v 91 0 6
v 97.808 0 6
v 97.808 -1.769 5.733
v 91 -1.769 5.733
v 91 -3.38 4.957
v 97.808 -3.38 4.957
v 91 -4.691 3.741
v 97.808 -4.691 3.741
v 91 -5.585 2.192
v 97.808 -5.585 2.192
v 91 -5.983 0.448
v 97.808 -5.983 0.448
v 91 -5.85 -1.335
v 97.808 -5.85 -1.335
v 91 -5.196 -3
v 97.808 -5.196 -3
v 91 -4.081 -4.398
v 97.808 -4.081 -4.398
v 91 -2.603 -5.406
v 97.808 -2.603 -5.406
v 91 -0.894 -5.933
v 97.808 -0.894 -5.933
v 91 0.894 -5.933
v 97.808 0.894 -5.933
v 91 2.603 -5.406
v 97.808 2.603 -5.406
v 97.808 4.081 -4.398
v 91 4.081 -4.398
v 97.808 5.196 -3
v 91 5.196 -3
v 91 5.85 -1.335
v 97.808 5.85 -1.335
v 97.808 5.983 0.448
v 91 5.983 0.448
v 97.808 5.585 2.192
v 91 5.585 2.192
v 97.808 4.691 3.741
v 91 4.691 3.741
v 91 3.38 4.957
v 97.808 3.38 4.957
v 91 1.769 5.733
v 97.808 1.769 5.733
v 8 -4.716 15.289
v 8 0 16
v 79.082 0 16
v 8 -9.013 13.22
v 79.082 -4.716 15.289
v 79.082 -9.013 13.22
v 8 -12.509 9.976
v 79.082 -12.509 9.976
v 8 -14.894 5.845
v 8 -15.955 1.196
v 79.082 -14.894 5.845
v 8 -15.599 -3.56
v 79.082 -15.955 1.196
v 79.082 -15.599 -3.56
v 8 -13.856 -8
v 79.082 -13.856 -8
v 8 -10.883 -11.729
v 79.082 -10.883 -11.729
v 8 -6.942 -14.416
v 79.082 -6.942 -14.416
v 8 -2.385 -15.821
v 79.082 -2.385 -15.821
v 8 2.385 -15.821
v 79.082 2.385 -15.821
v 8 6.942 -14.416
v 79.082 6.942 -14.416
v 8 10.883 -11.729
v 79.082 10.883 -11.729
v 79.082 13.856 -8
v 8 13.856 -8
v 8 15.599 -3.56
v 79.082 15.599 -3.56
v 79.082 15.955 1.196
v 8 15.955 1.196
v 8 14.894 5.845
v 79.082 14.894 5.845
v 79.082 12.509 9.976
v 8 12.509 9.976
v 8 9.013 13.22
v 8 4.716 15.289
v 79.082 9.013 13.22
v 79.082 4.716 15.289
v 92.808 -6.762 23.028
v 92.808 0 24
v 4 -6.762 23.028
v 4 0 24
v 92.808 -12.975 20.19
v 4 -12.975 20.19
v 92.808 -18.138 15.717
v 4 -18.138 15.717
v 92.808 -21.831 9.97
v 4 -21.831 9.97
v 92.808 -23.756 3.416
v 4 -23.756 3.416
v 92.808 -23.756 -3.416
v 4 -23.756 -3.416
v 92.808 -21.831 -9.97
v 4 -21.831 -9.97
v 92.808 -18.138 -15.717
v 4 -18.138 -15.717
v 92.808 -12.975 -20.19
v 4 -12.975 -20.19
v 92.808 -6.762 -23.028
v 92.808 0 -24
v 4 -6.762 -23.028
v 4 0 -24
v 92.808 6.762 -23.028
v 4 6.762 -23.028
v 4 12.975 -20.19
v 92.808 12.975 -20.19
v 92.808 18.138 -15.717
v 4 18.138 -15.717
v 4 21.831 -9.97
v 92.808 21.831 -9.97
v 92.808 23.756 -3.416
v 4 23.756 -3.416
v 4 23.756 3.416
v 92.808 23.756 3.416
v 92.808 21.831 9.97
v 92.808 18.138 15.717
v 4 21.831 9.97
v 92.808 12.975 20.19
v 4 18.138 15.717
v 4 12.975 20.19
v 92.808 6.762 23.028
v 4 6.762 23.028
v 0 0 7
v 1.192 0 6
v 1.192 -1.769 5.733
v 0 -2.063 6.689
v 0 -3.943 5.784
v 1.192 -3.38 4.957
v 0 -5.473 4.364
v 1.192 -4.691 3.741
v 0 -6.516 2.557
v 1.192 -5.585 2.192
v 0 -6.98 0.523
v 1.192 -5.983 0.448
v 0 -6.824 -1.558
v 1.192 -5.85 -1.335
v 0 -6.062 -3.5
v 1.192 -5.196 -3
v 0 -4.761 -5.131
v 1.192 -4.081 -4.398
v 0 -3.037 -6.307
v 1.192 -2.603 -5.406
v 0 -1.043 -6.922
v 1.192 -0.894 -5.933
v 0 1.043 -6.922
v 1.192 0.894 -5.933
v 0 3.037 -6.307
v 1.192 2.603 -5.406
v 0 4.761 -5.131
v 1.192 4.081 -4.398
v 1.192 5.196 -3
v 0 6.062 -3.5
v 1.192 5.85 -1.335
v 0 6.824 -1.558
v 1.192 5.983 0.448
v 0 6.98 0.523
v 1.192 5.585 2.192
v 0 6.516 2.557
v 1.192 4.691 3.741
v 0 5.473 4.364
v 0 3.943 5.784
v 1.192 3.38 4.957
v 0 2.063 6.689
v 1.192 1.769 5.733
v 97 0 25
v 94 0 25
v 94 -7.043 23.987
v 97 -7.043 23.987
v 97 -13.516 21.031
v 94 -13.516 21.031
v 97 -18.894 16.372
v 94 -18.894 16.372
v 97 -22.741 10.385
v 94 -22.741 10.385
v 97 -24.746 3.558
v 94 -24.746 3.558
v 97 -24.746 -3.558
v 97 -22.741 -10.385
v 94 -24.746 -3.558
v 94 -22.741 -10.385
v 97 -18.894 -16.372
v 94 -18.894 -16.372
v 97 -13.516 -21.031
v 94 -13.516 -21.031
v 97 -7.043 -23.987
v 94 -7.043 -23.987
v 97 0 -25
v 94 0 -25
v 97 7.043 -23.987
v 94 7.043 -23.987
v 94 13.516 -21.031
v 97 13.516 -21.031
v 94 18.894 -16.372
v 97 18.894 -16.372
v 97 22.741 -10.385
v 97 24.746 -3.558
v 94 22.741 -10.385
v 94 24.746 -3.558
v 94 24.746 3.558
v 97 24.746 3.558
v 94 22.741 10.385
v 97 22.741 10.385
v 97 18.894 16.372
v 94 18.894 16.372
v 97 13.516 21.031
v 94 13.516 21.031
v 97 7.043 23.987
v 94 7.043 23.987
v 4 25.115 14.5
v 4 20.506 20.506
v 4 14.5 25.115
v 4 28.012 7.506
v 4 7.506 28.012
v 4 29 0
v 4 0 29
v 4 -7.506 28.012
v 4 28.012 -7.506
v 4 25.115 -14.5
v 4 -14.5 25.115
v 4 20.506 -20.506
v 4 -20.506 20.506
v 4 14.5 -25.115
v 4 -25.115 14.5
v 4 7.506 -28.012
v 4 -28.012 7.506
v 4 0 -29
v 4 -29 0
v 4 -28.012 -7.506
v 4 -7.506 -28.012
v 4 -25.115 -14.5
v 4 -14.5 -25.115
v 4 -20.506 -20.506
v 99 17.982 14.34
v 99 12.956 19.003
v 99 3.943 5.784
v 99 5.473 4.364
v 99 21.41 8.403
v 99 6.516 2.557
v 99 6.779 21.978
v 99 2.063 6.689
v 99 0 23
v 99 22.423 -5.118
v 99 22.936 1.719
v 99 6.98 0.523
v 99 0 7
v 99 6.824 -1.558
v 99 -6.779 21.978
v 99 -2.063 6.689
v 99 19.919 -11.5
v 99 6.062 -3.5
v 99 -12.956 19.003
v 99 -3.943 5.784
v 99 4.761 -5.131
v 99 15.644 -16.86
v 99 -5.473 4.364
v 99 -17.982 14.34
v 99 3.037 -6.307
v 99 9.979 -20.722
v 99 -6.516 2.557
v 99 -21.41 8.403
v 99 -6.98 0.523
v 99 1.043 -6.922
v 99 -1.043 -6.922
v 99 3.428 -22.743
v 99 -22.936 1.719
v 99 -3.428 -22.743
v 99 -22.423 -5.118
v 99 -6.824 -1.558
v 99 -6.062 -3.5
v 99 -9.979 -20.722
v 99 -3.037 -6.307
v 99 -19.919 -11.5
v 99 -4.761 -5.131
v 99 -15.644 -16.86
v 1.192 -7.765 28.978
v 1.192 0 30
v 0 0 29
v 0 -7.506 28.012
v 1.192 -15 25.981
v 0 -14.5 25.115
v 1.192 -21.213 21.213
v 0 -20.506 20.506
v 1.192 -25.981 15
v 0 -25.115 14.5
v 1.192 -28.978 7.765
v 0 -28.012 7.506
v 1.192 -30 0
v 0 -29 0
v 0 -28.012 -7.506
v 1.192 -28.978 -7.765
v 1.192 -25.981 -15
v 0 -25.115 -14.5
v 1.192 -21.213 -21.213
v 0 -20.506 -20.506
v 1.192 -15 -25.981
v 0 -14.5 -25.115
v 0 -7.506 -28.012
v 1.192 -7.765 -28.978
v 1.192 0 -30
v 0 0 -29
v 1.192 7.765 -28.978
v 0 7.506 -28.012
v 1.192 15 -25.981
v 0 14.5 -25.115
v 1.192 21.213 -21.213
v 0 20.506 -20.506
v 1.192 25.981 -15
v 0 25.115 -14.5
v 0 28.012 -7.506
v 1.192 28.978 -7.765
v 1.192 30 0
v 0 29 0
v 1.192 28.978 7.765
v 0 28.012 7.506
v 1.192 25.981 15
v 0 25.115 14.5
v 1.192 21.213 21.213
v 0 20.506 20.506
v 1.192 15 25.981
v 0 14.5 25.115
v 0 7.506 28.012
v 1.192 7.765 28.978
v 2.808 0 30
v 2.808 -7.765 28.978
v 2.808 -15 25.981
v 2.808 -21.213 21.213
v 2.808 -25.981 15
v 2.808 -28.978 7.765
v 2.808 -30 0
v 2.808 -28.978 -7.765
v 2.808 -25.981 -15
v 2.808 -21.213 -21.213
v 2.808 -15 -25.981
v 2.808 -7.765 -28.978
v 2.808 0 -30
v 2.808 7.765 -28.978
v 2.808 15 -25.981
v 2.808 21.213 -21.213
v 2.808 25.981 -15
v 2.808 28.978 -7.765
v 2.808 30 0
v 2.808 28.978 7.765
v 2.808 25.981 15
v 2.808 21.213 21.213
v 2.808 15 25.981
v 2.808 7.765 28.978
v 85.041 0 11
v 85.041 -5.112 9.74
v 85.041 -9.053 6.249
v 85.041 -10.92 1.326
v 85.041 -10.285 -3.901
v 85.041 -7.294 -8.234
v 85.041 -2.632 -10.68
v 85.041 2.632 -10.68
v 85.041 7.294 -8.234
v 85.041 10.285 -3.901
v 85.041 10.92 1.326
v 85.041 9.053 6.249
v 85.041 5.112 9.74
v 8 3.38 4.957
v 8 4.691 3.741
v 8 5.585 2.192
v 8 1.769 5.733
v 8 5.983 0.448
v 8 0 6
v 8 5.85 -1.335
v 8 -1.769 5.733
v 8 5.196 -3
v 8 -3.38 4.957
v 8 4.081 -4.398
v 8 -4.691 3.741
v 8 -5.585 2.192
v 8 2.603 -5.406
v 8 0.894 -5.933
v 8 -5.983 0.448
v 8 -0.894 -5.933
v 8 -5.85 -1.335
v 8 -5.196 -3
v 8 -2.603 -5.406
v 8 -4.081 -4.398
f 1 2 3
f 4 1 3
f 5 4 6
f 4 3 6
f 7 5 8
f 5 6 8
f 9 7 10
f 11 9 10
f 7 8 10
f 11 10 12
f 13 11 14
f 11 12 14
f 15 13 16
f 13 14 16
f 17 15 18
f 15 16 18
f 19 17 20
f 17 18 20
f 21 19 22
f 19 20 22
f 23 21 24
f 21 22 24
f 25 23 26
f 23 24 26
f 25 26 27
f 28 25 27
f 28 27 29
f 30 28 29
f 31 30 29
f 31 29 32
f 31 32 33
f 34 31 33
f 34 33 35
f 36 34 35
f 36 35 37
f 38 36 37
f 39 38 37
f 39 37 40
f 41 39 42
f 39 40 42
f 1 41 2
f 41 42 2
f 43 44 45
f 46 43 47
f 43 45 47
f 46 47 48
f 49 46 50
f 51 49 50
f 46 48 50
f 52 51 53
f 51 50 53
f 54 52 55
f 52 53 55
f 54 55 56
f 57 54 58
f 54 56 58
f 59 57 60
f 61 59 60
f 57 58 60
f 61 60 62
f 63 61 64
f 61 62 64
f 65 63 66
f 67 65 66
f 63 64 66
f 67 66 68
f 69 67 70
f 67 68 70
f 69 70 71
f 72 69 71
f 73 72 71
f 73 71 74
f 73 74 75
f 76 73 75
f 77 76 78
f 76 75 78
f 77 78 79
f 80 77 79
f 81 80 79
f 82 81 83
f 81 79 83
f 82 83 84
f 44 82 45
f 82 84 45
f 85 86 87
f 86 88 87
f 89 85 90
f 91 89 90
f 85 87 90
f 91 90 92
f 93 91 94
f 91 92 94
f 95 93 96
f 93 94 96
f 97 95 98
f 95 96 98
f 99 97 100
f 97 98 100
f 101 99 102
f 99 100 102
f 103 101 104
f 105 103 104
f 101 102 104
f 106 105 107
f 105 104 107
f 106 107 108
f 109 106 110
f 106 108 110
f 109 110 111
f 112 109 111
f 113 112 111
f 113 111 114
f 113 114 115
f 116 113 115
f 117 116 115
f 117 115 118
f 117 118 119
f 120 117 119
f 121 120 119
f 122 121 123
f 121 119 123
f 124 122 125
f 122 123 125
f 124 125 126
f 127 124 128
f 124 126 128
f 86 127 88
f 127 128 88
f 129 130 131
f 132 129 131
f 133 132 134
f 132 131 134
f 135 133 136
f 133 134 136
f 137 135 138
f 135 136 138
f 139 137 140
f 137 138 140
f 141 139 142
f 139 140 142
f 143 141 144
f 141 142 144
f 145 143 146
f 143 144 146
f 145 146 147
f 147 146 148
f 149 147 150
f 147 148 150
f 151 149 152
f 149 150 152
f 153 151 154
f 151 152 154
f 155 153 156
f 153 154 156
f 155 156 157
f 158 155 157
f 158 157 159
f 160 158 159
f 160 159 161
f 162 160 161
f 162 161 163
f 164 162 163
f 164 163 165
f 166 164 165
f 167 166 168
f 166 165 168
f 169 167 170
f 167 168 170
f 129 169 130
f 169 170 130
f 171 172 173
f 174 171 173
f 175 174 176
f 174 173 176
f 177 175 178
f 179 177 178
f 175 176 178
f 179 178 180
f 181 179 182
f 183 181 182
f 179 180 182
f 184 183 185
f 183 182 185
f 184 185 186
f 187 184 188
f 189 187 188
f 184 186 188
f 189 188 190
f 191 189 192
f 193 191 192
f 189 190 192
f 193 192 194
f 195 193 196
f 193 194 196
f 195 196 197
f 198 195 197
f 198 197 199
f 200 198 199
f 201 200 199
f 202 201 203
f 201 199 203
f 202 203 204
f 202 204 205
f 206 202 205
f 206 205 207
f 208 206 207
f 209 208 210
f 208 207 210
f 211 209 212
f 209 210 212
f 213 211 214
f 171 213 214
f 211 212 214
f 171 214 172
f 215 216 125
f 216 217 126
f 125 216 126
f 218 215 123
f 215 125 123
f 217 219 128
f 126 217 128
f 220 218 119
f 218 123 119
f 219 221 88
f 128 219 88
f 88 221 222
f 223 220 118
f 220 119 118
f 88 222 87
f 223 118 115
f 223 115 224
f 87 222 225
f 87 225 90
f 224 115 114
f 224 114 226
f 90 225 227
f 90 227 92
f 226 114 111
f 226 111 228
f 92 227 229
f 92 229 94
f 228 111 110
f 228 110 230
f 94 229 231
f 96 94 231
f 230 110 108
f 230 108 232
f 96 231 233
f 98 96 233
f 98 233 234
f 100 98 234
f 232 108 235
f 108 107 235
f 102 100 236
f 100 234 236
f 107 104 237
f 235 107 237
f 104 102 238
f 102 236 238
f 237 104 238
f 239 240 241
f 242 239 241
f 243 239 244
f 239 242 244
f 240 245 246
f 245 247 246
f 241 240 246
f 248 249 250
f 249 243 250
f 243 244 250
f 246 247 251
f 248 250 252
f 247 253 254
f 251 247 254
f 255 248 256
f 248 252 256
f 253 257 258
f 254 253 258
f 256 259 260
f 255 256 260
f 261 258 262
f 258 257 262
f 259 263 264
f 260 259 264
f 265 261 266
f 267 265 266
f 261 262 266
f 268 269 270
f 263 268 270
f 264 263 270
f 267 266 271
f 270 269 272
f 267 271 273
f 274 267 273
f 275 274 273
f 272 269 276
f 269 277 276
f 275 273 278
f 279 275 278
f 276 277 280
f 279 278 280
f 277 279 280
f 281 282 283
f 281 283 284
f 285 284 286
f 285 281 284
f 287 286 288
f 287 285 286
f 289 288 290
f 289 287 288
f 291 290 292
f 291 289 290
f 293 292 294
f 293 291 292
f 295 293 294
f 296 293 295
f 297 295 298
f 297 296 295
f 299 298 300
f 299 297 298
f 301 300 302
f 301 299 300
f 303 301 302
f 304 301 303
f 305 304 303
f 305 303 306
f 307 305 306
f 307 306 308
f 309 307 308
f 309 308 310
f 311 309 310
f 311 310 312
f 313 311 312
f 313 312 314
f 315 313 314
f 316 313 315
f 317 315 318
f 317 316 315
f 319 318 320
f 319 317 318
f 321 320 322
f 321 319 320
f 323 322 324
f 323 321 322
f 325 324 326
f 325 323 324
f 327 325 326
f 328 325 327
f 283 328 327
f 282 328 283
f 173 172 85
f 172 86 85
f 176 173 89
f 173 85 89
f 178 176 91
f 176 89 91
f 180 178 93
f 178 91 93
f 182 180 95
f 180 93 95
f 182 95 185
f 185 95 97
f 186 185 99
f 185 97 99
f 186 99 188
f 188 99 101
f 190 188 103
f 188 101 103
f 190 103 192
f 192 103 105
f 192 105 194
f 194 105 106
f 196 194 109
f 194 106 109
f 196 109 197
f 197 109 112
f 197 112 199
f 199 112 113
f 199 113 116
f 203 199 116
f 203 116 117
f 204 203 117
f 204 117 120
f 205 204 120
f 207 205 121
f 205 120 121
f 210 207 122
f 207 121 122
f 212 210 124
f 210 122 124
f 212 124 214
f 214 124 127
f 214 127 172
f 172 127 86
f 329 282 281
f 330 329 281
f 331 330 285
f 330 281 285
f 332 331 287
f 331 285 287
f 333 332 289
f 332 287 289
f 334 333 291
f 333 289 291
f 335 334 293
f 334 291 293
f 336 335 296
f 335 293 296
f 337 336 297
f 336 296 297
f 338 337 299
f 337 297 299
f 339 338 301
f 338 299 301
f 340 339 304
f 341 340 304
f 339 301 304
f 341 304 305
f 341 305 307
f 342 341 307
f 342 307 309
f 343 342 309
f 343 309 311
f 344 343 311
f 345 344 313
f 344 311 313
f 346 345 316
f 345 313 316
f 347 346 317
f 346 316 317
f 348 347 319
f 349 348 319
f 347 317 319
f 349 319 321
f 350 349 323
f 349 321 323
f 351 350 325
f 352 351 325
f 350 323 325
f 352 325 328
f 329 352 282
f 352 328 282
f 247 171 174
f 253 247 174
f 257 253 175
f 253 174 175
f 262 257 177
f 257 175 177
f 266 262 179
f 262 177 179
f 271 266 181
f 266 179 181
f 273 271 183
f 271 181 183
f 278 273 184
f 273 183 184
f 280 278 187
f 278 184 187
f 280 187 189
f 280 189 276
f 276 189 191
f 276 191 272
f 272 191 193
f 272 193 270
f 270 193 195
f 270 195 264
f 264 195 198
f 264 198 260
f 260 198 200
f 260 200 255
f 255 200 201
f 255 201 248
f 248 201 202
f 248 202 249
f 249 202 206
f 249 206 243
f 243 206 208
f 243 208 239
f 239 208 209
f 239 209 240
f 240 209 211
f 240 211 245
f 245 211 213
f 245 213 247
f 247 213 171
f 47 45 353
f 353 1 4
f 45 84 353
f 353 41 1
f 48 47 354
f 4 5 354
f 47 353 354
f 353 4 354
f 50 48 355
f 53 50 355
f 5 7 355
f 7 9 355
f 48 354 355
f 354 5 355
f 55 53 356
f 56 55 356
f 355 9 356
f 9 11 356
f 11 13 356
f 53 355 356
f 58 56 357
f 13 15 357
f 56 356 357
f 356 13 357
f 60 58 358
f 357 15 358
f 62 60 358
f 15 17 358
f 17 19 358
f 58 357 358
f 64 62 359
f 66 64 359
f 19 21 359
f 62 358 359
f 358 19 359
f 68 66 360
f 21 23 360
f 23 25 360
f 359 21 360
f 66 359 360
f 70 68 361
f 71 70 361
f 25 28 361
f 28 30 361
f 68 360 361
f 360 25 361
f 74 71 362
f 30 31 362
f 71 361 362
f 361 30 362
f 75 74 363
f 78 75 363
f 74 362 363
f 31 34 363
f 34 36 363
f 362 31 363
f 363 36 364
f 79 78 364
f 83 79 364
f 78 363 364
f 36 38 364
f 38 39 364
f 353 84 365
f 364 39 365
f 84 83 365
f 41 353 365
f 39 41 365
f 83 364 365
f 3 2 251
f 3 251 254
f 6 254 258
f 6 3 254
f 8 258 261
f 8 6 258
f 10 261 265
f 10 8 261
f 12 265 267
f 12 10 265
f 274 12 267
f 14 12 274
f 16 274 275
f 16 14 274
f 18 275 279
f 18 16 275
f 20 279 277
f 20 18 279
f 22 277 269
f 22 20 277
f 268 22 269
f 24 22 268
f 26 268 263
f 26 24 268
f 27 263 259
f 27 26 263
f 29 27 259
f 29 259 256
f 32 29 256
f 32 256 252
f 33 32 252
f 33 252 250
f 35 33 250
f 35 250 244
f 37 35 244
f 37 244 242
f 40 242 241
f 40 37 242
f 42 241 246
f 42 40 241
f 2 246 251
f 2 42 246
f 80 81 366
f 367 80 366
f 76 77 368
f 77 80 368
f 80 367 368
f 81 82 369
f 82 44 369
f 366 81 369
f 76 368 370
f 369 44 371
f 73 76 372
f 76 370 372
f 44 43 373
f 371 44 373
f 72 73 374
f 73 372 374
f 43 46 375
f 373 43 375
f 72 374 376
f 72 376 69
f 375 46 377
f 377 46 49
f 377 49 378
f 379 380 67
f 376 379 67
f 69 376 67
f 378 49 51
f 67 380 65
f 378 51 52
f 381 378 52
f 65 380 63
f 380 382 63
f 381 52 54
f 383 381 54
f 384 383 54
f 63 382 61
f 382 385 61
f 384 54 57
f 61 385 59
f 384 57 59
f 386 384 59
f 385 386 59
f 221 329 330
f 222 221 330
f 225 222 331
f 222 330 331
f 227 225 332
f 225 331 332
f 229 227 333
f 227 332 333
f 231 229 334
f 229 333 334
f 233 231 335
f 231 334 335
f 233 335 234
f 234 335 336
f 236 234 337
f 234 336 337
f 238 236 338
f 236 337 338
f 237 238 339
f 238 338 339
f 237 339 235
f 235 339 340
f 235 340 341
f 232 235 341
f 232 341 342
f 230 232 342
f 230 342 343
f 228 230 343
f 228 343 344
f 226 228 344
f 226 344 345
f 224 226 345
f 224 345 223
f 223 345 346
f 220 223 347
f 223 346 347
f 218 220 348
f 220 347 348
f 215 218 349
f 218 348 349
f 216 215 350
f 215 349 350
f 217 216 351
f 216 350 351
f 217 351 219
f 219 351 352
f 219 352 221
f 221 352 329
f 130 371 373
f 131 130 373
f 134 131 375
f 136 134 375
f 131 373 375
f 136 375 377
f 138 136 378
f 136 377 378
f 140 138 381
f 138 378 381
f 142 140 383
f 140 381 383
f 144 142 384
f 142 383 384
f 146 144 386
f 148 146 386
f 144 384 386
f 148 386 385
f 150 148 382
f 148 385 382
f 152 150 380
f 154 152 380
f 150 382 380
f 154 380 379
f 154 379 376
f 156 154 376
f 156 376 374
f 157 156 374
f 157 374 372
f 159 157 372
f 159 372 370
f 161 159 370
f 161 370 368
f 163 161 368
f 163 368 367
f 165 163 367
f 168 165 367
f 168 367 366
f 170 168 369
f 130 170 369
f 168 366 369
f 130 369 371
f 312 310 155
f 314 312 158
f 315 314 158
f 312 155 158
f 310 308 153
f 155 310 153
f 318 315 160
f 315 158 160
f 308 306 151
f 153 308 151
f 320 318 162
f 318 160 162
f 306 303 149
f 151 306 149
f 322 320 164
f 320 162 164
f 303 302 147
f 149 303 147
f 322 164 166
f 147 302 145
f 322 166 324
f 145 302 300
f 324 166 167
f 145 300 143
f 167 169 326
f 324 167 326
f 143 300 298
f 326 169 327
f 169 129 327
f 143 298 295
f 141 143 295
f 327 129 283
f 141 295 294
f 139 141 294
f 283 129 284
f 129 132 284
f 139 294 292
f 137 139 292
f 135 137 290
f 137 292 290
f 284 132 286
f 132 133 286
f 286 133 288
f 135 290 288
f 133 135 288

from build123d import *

# Parameters (mm, degrees)
F2_SIZE2 = 1.1917535926
F2_SIZE  = 1
F3_SIZE2 = 1.1917535926
F3_SIZE  = 1
F4_SIZE  = 2
F5_SIZE2 = 1.1917535926
F5_SIZE  = 1
F6_SIZE2 = 1.1917535926
F6_SIZE  = 1


with BuildPart() as f1:
    # F0 (on Front) → F1 (revolve)
    with BuildSketch(Plane.XZ):
        Polygon((0, 30), (0, 6), (8, 6), (8, 16), (79.0824640741, 16), (91, 6), (99, 6), (99, 25), (94, 25), (92.8082464074, 24), (4, 24), (4, 30), align=None)
    revolve(axis=Axis((29.4127222821, 0, 0), (1, 0, 0)))

    # F2
    f2_edges = [f1.edges().sort_by_distance(p)[0] for p in [
        (0, 0, -6),
    ]]
    f2_side = f1.faces().sort_by_distance((0, 0, -29.151472))[0]
    chamfer(f2_edges, length=F2_SIZE, length2=F2_SIZE2, reference=f2_side)

    # F3
    f3_edges = [f1.edges().sort_by_distance(p)[0] for p in [
        (99, 0, -6),
    ]]
    f3_side = f1.faces().sort_by_distance((99, 0, -6.707107))[0]
    chamfer(f3_edges, length=F3_SIZE, length2=F3_SIZE2, reference=f3_side)

    # F4
    f4_edges = [f1.edges().sort_by_distance(p)[0] for p in [
        (99, 0, -25),
    ]]
    chamfer(f4_edges, length=F4_SIZE)

    # F5
    f5_edges = [f1.edges().sort_by_distance(p)[0] for p in [
        (0, 0, -30),
    ]]
    f5_side = f1.faces().sort_by_distance((0, 0, -7.848528))[0]
    chamfer(f5_edges, length=F5_SIZE, length2=F5_SIZE2, reference=f5_side)

    # F6
    f6_edges = [f1.edges().sort_by_distance(p)[0] for p in [
        (4, 0, -30),
    ]]
    f6_side = f1.faces().sort_by_distance((4, 0, -24.848528))[0]
    chamfer(f6_edges, length=F6_SIZE, length2=F6_SIZE2, reference=f6_side)


solid = f1.part
